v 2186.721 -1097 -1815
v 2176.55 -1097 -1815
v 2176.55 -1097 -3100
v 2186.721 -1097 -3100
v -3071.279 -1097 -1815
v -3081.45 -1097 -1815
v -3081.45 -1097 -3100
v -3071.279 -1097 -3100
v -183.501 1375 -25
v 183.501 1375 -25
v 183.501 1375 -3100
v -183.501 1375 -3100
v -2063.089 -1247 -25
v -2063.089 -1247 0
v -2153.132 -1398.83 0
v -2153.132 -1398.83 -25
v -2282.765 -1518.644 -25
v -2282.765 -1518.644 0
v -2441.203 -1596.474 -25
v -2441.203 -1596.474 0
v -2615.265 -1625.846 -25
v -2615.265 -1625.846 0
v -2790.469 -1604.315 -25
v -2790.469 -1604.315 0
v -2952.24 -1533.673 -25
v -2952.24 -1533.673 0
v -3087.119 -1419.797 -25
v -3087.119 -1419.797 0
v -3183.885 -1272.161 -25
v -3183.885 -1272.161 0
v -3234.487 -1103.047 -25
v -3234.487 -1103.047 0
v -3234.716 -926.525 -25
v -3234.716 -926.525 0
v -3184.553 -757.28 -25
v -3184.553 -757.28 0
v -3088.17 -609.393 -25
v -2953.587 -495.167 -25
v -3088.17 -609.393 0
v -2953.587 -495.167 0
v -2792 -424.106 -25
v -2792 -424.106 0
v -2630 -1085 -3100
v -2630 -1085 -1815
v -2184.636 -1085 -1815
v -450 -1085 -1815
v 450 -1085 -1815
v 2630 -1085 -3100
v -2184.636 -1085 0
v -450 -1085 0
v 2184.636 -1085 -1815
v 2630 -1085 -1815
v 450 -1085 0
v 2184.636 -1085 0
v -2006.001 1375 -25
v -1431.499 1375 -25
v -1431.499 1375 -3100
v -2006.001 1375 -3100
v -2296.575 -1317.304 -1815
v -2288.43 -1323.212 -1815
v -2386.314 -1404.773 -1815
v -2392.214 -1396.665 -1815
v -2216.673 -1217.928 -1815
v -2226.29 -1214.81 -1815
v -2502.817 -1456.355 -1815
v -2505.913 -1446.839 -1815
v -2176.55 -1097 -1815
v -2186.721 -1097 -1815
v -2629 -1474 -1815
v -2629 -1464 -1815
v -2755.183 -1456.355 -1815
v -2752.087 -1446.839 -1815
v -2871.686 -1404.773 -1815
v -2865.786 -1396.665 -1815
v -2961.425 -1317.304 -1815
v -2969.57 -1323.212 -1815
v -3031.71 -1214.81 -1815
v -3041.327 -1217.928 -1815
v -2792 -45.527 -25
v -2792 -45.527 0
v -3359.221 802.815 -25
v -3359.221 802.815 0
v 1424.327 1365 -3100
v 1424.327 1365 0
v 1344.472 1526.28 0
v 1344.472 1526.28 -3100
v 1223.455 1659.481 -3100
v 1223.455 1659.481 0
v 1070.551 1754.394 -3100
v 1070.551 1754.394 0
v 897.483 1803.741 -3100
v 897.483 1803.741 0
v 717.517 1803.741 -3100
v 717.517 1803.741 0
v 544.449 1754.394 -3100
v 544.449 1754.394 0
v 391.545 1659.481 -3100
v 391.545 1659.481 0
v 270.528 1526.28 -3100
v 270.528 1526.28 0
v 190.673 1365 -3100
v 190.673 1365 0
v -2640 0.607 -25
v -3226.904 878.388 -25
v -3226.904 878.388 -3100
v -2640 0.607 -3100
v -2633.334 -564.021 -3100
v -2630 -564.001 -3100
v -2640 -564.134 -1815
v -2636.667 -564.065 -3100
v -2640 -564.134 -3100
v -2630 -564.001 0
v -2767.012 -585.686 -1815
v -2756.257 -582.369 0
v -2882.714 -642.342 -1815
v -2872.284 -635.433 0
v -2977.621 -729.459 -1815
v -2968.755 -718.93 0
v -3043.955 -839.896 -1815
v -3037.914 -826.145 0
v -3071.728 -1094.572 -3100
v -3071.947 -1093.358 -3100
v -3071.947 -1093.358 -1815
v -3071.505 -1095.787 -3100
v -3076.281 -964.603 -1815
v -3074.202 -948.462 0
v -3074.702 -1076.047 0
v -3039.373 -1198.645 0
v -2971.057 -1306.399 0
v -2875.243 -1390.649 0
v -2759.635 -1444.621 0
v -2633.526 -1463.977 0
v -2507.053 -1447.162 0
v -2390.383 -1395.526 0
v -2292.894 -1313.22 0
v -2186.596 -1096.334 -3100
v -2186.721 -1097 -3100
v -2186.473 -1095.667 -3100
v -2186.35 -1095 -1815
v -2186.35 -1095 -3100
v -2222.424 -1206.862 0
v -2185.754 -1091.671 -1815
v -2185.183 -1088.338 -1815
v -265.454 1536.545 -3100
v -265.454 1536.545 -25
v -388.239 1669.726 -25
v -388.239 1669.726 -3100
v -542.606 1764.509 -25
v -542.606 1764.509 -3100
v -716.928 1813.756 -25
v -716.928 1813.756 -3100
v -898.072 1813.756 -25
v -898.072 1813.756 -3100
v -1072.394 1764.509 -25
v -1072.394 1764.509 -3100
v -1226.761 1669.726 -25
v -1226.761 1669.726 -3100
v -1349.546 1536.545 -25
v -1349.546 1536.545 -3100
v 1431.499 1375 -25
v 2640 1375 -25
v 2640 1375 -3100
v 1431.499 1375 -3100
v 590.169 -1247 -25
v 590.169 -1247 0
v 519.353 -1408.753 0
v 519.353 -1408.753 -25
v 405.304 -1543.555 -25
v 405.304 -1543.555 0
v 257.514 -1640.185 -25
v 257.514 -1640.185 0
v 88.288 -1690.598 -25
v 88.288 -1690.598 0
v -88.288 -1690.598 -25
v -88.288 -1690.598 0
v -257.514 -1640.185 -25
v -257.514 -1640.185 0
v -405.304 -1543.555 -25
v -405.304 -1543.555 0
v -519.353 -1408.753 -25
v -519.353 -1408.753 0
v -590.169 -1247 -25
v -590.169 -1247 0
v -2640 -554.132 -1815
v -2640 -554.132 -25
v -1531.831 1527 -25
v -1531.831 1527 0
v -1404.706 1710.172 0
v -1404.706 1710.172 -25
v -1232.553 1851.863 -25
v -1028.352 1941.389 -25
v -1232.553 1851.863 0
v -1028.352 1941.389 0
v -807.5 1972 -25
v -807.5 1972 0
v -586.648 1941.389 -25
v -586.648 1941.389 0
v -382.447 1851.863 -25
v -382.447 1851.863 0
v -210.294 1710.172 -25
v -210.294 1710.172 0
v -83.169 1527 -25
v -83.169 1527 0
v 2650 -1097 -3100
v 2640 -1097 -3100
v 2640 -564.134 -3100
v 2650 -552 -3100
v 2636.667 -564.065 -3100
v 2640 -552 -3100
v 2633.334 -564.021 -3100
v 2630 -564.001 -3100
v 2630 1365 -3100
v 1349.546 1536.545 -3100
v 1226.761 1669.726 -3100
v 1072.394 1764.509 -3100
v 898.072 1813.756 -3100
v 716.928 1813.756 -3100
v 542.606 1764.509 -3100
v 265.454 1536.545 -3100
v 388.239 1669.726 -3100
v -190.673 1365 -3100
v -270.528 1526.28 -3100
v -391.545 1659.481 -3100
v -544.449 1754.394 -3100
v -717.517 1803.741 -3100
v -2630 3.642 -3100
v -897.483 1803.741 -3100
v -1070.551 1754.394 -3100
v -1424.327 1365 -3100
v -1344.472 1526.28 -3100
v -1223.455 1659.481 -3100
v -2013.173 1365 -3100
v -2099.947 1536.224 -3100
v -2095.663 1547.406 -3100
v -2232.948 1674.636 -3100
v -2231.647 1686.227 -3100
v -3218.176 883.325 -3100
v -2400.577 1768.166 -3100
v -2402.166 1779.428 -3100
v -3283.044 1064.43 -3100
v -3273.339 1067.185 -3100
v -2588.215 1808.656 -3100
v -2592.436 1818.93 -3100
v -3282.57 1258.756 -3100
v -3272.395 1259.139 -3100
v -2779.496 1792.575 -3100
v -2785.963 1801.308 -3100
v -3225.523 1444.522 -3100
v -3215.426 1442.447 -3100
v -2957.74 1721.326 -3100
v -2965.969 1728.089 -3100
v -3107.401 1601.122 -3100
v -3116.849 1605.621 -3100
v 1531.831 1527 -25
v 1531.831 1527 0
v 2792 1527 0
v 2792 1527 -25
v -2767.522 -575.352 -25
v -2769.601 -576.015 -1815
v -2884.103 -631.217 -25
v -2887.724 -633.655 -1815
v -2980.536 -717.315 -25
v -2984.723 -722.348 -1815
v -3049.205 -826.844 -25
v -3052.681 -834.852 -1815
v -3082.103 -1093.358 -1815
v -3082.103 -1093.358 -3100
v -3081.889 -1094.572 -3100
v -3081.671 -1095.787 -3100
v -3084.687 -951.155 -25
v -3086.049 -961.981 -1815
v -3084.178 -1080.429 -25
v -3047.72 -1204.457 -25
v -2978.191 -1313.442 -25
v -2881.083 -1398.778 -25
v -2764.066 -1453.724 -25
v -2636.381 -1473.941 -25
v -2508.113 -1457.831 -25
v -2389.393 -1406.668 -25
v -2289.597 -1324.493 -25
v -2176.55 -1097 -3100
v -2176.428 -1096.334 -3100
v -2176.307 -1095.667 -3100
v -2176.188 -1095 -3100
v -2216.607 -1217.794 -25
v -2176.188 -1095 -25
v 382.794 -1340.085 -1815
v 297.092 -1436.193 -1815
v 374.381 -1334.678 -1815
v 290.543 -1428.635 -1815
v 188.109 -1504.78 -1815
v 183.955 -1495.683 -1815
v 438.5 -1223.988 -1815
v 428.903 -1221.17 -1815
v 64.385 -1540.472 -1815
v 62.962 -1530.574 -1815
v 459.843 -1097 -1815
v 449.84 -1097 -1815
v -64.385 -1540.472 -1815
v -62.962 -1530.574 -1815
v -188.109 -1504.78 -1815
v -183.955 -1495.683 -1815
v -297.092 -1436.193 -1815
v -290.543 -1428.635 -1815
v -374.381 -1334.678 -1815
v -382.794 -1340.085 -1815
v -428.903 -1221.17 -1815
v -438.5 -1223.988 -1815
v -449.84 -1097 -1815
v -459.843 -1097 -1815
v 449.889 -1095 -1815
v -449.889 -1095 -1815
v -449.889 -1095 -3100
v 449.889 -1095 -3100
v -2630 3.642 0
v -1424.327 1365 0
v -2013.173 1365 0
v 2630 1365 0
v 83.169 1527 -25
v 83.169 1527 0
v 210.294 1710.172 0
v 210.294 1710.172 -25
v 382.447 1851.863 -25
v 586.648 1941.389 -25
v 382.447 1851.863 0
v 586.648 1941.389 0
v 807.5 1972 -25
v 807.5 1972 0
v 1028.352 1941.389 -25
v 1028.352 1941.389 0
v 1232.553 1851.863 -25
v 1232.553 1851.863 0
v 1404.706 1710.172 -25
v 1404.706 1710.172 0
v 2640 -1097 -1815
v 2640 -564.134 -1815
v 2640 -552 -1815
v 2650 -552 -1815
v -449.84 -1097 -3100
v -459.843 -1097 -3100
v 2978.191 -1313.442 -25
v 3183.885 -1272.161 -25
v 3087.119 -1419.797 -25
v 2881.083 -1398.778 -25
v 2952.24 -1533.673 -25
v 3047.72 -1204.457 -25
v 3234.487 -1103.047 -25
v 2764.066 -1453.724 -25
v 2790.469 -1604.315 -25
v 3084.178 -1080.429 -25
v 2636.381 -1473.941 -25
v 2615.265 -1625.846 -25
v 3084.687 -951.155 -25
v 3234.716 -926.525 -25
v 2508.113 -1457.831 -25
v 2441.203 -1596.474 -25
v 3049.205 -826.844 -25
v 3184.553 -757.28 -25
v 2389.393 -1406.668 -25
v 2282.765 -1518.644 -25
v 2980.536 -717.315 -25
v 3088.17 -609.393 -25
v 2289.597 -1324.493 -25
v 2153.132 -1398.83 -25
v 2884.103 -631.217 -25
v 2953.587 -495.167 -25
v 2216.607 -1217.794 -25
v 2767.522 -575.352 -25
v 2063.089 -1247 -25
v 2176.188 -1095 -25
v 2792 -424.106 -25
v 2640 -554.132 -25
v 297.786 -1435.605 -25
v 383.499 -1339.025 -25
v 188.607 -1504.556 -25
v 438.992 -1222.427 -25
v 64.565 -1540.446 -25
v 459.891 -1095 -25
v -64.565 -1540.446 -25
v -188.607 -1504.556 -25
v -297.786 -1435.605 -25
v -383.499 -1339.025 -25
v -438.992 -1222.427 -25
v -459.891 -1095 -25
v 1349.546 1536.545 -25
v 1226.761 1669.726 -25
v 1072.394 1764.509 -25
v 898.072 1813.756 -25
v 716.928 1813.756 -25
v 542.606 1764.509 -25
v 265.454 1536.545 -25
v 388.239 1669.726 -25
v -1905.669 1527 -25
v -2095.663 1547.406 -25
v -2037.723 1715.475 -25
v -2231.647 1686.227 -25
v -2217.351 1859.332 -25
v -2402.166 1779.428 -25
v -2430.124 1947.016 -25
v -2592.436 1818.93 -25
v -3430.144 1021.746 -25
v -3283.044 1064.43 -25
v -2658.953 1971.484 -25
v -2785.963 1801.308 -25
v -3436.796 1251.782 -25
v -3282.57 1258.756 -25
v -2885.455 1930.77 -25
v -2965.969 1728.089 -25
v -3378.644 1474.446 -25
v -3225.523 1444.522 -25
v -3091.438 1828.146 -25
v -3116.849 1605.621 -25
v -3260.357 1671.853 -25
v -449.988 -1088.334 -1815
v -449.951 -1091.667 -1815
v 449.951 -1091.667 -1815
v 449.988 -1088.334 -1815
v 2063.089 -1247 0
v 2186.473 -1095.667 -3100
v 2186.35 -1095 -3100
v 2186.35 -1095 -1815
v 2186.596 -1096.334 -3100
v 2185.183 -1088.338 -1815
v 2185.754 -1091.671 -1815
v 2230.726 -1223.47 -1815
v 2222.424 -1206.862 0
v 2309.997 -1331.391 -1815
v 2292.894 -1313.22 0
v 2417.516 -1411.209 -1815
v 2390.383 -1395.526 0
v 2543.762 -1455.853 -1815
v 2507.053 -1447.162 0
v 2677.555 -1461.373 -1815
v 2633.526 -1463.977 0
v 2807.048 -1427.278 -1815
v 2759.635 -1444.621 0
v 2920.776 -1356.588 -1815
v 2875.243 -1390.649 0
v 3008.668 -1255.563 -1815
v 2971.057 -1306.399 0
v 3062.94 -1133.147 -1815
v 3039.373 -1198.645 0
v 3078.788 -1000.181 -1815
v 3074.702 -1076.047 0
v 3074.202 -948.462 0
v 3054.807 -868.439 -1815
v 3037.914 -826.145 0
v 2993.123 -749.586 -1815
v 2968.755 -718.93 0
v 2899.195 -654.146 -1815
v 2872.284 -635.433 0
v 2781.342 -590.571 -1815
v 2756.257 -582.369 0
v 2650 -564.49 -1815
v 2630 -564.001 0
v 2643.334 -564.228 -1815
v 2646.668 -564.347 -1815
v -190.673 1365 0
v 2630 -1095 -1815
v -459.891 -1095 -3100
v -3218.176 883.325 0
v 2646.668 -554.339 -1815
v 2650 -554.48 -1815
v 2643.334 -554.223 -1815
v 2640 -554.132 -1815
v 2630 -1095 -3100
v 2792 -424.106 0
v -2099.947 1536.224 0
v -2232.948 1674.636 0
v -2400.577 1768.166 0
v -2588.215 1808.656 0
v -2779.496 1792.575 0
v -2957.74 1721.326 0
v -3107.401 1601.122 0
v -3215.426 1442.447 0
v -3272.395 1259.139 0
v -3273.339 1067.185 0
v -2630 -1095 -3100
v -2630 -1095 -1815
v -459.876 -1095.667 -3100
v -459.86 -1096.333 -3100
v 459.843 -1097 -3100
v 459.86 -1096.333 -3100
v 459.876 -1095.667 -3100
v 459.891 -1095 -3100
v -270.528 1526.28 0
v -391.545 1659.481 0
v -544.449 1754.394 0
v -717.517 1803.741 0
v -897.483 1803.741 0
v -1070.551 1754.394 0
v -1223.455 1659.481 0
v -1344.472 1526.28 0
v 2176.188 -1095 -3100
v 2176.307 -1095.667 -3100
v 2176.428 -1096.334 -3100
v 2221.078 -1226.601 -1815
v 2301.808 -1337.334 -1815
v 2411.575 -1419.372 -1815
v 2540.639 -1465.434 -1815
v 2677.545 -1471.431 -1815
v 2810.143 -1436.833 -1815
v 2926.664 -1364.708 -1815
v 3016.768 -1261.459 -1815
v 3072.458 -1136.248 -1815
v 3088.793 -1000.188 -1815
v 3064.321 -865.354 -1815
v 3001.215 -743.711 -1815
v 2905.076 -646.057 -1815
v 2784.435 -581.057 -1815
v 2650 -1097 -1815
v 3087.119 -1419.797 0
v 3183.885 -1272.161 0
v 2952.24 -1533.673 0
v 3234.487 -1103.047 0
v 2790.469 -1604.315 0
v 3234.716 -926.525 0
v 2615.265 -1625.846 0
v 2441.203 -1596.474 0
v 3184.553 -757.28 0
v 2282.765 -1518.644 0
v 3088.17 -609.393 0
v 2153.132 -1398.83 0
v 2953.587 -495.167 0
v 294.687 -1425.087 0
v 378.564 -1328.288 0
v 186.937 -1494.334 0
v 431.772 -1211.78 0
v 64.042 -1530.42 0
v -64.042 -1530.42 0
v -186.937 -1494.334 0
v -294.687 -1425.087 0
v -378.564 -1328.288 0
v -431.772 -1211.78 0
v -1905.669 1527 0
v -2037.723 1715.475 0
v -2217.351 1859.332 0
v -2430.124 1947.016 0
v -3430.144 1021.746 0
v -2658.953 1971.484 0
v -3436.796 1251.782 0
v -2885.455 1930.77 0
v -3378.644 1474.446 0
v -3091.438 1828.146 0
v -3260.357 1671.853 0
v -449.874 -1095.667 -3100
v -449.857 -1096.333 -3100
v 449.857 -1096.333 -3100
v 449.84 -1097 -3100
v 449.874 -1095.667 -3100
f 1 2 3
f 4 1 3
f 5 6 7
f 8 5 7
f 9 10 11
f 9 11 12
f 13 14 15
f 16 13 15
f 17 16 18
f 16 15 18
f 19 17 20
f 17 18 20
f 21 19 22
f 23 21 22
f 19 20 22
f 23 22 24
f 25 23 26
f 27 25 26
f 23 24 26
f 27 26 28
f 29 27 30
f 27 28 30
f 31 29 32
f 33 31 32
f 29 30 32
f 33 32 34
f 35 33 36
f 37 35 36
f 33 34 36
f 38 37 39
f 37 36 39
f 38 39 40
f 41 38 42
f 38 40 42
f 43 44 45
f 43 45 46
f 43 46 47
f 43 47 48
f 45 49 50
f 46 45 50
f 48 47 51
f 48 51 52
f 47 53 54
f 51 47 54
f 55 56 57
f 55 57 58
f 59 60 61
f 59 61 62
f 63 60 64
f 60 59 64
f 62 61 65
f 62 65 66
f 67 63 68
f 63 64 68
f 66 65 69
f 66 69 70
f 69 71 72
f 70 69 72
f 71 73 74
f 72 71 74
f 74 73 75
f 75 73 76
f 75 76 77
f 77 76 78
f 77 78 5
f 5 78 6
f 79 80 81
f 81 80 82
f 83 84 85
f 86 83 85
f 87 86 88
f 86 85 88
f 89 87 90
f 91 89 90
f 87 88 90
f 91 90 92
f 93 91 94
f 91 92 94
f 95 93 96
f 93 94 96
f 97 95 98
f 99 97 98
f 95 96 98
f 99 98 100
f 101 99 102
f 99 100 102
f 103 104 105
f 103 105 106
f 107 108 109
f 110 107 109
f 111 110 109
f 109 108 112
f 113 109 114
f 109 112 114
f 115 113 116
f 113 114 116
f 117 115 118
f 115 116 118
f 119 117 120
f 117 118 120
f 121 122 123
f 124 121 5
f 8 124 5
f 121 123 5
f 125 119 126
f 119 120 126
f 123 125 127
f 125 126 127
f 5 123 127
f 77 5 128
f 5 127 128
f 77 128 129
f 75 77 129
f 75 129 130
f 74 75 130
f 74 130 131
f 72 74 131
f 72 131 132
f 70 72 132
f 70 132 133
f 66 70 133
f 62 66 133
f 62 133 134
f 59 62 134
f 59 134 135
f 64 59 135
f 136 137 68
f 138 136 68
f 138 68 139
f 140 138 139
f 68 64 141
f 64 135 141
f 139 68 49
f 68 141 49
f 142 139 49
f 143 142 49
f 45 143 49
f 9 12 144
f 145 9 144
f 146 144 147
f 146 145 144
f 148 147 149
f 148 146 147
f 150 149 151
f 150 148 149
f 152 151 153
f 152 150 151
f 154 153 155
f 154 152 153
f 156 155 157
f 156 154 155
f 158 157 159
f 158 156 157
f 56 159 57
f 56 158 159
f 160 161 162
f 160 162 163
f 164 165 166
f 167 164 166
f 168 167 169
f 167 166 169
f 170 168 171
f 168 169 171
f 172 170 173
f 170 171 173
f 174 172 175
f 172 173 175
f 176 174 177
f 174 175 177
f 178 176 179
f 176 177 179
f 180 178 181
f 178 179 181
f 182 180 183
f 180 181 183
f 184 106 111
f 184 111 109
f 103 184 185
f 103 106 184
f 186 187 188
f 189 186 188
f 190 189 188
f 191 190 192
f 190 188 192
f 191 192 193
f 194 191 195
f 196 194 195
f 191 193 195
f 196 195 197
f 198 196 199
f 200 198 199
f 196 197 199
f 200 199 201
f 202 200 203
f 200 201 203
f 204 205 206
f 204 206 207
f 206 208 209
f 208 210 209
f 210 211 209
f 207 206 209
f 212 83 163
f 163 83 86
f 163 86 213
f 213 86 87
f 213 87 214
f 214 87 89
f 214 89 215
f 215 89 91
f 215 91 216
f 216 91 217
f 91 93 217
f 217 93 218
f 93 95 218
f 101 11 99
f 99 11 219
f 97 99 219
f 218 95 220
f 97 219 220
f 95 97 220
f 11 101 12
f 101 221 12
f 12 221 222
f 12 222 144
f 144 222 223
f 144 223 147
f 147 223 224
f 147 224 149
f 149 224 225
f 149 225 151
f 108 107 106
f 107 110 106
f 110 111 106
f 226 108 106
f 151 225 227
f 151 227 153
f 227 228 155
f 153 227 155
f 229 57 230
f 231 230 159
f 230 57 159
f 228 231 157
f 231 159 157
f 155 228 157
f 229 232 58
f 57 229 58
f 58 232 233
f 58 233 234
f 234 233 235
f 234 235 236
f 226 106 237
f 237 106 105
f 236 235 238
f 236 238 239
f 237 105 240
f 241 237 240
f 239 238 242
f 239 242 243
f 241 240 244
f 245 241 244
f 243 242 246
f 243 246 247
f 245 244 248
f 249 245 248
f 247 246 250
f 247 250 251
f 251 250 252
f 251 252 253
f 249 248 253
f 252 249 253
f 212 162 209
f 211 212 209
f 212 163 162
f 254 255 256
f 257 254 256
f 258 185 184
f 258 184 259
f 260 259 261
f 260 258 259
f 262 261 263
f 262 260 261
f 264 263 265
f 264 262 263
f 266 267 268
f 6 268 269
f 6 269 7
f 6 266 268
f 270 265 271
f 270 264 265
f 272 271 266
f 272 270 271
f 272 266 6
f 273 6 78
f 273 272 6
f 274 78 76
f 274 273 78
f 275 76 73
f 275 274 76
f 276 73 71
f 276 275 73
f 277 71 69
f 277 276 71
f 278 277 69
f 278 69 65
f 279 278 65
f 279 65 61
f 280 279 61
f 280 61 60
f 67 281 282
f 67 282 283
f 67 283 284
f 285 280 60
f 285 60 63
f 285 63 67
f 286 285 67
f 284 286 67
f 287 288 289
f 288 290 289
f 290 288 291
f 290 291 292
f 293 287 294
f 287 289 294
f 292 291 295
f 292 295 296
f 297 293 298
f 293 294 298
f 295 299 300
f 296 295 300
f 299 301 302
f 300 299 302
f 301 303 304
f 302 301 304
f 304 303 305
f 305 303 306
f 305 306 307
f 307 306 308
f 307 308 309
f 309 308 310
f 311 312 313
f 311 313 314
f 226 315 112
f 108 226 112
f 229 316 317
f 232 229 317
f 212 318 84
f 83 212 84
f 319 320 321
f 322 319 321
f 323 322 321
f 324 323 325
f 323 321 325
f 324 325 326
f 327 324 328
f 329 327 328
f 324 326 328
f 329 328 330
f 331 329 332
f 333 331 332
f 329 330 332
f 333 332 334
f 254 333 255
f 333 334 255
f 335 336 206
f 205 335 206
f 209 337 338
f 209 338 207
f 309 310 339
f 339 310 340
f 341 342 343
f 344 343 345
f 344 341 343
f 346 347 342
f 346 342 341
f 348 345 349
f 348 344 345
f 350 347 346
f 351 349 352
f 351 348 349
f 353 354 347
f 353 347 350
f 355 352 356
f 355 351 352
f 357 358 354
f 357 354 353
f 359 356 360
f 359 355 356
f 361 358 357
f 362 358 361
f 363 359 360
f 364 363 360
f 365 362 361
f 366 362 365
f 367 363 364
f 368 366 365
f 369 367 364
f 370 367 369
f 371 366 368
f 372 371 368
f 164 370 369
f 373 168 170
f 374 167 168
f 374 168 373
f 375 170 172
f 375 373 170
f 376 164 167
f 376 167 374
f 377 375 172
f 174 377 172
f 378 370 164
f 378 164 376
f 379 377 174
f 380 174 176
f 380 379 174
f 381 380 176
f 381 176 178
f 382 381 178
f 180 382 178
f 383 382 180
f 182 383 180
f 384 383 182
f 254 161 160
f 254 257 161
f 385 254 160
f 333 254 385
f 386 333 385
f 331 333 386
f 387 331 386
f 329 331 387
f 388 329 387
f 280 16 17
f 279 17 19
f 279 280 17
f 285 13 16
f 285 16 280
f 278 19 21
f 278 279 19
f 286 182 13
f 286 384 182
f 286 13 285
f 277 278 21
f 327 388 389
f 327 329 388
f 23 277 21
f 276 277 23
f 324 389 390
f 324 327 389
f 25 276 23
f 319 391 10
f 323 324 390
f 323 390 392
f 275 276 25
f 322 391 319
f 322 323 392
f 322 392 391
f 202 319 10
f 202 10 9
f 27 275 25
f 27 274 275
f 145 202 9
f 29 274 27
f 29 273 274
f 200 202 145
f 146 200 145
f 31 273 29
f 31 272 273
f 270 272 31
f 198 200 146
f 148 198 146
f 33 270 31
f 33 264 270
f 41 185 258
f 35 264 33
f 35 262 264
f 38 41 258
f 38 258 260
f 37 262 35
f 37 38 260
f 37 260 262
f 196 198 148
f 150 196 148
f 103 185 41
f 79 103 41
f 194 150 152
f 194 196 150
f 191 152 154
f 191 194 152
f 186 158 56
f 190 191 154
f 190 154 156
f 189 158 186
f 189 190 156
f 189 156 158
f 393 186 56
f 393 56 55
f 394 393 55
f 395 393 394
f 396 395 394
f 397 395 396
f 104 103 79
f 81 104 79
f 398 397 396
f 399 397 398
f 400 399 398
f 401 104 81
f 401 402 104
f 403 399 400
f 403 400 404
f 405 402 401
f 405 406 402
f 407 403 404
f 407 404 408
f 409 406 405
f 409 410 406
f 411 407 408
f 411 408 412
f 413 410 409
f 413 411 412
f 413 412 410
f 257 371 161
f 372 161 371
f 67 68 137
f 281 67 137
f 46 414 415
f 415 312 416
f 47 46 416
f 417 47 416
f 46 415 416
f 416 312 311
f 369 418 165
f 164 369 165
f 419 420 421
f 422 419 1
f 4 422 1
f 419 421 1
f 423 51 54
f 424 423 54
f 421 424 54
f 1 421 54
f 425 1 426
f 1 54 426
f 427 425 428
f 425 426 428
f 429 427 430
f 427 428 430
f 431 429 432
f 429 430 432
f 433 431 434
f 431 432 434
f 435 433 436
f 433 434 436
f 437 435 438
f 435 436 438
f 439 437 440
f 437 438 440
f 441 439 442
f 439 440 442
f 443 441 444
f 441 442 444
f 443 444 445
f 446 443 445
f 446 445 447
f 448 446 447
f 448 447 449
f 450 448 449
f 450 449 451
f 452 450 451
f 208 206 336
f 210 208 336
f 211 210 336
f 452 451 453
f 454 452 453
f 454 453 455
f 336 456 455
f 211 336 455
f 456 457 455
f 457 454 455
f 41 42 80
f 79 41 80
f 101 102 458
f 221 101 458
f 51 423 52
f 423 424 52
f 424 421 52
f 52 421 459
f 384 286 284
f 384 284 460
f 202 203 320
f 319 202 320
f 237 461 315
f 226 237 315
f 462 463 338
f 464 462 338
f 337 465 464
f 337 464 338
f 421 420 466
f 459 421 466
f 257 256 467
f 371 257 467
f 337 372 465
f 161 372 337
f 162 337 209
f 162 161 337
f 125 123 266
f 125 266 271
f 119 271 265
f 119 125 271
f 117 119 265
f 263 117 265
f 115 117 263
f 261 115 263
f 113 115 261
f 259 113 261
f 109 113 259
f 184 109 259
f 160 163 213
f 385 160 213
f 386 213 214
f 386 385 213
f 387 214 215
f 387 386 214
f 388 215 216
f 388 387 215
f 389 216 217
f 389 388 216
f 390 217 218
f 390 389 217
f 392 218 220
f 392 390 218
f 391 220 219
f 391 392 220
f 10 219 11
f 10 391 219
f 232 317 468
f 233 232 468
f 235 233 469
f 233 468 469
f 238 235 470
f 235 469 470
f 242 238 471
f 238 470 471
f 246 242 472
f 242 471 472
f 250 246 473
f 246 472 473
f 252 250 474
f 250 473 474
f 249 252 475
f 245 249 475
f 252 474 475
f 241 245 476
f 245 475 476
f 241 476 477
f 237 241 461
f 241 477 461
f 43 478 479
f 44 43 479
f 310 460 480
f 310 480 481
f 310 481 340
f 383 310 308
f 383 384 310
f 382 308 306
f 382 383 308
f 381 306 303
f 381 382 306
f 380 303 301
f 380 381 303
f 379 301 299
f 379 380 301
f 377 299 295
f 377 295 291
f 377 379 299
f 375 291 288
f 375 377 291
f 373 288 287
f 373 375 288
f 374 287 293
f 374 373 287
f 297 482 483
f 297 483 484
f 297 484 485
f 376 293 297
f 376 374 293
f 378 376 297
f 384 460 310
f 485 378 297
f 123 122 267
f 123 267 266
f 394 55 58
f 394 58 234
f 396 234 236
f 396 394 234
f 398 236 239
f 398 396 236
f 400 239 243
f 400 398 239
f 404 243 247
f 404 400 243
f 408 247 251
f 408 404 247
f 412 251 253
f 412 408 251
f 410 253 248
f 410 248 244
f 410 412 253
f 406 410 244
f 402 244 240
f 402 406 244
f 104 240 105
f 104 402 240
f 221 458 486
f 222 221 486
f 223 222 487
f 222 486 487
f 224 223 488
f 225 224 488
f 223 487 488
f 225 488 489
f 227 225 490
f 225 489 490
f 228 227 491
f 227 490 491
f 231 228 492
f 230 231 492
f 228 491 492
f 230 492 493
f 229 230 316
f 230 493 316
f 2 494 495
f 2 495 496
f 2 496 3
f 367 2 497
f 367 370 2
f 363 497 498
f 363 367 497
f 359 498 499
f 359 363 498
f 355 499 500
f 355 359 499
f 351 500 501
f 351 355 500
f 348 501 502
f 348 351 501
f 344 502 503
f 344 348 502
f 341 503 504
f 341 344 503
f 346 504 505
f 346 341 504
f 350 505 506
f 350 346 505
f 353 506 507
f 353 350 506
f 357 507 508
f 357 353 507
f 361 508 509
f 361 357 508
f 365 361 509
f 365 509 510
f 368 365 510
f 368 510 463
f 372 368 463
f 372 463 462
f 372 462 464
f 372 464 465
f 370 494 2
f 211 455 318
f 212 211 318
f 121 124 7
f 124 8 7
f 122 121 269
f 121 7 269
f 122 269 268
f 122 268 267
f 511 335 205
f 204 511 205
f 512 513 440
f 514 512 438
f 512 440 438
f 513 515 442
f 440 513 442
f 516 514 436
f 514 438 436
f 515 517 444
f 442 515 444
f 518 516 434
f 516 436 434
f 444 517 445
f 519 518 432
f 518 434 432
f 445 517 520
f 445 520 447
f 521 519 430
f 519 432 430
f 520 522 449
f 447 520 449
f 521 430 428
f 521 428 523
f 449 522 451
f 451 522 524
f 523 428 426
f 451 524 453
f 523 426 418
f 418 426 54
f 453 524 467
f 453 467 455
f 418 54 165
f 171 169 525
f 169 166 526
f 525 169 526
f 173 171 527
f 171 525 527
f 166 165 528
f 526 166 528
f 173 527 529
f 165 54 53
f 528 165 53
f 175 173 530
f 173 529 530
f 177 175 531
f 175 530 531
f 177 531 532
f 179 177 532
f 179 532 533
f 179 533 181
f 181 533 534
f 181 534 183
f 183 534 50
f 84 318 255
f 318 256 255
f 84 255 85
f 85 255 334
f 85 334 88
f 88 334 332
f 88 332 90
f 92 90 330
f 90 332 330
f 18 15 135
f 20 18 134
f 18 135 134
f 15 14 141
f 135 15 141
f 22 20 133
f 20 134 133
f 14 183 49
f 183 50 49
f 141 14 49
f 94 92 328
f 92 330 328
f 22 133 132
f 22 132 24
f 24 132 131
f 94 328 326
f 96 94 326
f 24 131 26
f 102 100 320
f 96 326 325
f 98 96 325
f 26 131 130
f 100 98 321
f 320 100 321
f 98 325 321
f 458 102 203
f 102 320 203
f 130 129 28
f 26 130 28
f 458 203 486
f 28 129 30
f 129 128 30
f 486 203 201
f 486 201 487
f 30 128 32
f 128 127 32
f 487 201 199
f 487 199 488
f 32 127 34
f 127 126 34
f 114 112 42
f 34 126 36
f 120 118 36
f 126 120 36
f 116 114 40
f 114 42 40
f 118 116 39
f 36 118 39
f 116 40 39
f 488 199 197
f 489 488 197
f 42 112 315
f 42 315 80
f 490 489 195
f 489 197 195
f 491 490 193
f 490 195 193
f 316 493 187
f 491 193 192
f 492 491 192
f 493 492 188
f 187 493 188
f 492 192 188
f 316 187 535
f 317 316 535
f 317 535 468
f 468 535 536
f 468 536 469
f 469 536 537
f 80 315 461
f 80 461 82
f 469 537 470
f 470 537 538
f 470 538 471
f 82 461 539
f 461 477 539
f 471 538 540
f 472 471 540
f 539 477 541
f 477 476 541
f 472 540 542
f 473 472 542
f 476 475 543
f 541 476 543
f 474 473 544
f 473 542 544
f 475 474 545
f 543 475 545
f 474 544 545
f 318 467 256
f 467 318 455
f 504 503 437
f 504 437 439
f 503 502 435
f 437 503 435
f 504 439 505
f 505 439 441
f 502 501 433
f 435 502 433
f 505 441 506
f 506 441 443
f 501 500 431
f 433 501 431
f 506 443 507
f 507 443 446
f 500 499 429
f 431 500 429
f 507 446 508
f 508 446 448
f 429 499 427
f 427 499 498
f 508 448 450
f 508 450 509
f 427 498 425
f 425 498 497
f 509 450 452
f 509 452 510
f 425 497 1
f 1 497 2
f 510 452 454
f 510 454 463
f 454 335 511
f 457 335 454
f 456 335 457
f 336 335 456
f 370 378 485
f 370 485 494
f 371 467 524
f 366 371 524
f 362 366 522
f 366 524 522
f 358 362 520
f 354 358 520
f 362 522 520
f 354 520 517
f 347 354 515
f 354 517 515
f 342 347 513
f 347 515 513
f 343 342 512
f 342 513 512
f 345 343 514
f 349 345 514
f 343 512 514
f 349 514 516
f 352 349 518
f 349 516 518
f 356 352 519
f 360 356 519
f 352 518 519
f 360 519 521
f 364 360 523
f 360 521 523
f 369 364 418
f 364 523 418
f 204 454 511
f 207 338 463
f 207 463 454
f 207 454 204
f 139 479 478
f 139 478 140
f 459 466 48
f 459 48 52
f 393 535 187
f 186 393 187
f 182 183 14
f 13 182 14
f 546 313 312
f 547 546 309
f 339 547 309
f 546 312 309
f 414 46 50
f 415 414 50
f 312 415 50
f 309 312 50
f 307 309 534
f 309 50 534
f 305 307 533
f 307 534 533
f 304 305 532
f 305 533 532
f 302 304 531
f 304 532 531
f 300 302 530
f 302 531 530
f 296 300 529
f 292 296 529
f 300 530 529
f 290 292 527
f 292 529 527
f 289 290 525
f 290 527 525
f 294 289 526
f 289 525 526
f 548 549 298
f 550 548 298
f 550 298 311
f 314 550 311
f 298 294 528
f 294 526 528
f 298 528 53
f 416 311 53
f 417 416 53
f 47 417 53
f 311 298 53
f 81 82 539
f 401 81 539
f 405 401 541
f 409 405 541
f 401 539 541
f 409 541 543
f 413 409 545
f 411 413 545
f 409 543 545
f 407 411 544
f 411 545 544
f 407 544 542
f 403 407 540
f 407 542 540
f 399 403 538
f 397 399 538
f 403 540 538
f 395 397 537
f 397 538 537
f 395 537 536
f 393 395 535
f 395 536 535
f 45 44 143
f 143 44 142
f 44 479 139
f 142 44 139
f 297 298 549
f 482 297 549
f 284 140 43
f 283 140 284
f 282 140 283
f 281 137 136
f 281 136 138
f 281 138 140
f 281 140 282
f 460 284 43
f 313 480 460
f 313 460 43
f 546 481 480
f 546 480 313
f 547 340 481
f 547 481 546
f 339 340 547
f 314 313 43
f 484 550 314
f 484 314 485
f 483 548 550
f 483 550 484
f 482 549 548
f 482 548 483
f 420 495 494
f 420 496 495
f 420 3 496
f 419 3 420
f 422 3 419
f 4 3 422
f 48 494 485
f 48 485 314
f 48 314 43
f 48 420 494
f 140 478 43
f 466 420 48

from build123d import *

# Parameters (mm, degrees)
EXTRUDE_THIN2_DEPTH     = 3100
BOSS_EXTRUDE2_DEPTH     = 25
CUT_EXTRUDE1_DEPTH      = 7106.596948885
CUT_EXTRUDE1_DEPTH_BACK = 7106.596948885
SKETCH7_W               = 1405.301830193
SKETCH7_H               = 450
SKETCH8_W               = 5260
SKETCH8_H               = 1285
BOSS_EXTRUDE3_DEPTH     = 10
CUT_EXTRUDE2_OUTLINE_W  = 1285
CUT_EXTRUDE2_OUTLINE_H  = 545
CUT_EXTRUDE2_DEPTH      = 449
SKETCH10_W              = 1285
SKETCH10_H              = 545
BOSS_EXTRUDE4_DEPTH     = 10
CUT_EXTRUDE3_OUTLINE_W  = 1285
CUT_EXTRUDE3_OUTLINE_H  = 541.35782885
CUT_EXTRUDE3_DEPTH      = 449


# Read off the part's stored shape, not the designer's step: Cut-Extrude2, Cut-Extrude3
with BuildPart() as part:
    # body → Extrude-Thin2 (new body)
    with BuildSketch(Plane.XY):
        with BuildLine():
            Line((-3226.904268523, 878.38804319), (-2640, 0.607028525))
            Line((-2640, 0.607028525), (-2640, -554.131540547))
            ThreePointArc((-2640, -554.131540547), (-2978.190785718, -1313.44247389), (-2176.187676846, -1095))
            Line((-2176.187676846, -1095), (-459.891291503, -1095))
            ThreePointArc((-459.891291503, -1095), (0, -1545), (459.891291503, -1095))
            Line((459.891291503, -1095), (2176.187676846, -1095))
            ThreePointArc((2176.187676846, -1095), (2978.190785718, -1313.44247389), (2640, -554.131540547))
            Line((2640, -554.131540547), (2640, 1375))
            Line((2640, 1375), (1431.499198717, 1375))
            ThreePointArc((1431.499198717, 1375), (807.5, 1820), (183.500801283, 1375))
            Line((183.500801283, 1375), (-183.500801283, 1375))
            ThreePointArc((-183.500801283, 1375), (-807.5, 1820), (-1431.499198717, 1375))
            Line((-1431.499198717, 1375), (-2006.000801283, 1375))
            ThreePointArc((-2006.000801283, 1375), (-2878.675275655, 1771.359638247), (-3226.904268523, 878.38804319))
        make_face()
        with BuildLine():
            Line((-3218.17614189, 883.325414771), (-2630, 3.64217115))
            Line((-2630, 3.64217115), (-2630, -564.001111112))
            ThreePointArc((-2630, -564.001111112), (-2971.056689396, -1306.399078725), (-2184.636410132, -1085))
            Line((-2184.636410132, -1085), (-450, -1085))
            ThreePointArc((-450, -1085), (0, -1535), (450, -1085))
            Line((450, -1085), (2184.636410132, -1085))
            ThreePointArc((2184.636410132, -1085), (2971.056689396, -1306.399078725), (2630, -564.001111112))
            Line((2630, -564.001111112), (2630, 1365))
            Line((2630, 1365), (1424.326555849, 1365))
            ThreePointArc((1424.326555849, 1365), (807.5, 1810), (190.673444151, 1365))
            Line((190.673444151, 1365), (-190.673444151, 1365))
            ThreePointArc((-190.673444151, 1365), (-807.5, 1810), (-1424.326555849, 1365))
            Line((-1424.326555849, 1365), (-2013.173444151, 1365))
            ThreePointArc((-2013.173444151, 1365), (-2871.262954199, 1763.566224147), (-3218.17614189, 883.325414771))
        make_face(mode=Mode.SUBTRACT)
    extrude(amount=-EXTRUDE_THIN2_DEPTH)

    # curb → Boss-Extrude2 (add)
    with BuildSketch(Plane.XY):
        with BuildLine():
            Line((-83.169274433, 1527), (83.169274433, 1527))
            ThreePointArc((83.169274433, 1527), (807.5, 1972), (1531.830725567, 1527))
            Line((1531.830725567, 1527), (2792, 1527))
            Line((2792, 1527), (2792, -424.105941715))
            ThreePointArc((2792, -424.105941715), (3087.118903787, -1419.796833395), (2063.089229648, -1247))
            Line((2063.089229648, -1247), (590.169467187, -1247))
            ThreePointArc((590.169467187, -1247), (0, -1697), (-590.169467187, -1247))
            Line((-590.169467187, -1247), (-2063.089229648, -1247))
            ThreePointArc((-2063.089229648, -1247), (-3087.118903787, -1419.796833395), (-2792, -424.105941715))
            Line((-2792, -424.105941715), (-2792, -45.527139379))
            Line((-2792, -45.527139379), (-3359.22062819, 802.81478835))
            ThreePointArc((-3359.22062819, 802.81478835), (-2992.100860231, 1886.792244744), (-1905.669274433, 1527))
            Line((-1905.669274433, 1527), (-1531.830725567, 1527))
            ThreePointArc((-1531.830725567, 1527), (-807.5, 1972), (-83.169274433, 1527))
        make_face()
        with BuildLine():
            ThreePointArc((-2006.000801283, 1375), (-2878.675275655, 1771.359638247), (-3226.904268523, 878.38804319))
            Line((-3226.904268523, 878.38804319), (-2640, 0.607028525))
            Line((-2640, 0.607028525), (-2640, -554.131540547))
            ThreePointArc((-2640, -554.131540547), (-2978.190785718, -1313.44247389), (-2176.187676846, -1095))
            Line((-2176.187676846, -1095), (-459.891291503, -1095))
            ThreePointArc((-459.891291503, -1095), (0, -1545), (459.891291503, -1095))
            Line((459.891291503, -1095), (2176.187676846, -1095))
            ThreePointArc((2176.187676846, -1095), (2978.190785718, -1313.44247389), (2640, -554.131540547))
            Line((2640, -554.131540547), (2640, 1375))
            Line((2640, 1375), (1431.499198717, 1375))
            ThreePointArc((1431.499198717, 1375), (807.5, 1820), (183.500801283, 1375))
            Line((183.500801283, 1375), (-183.500801283, 1375))
            ThreePointArc((-183.500801283, 1375), (-807.5, 1820), (-1431.499198717, 1375))
            Line((-1431.499198717, 1375), (-2006.000801283, 1375))
        make_face(mode=Mode.SUBTRACT)
    extrude(amount=-BOSS_EXTRUDE2_DEPTH)

    # Sketch7 → Cut-Extrude1 (cut, two sides: drawn at the far end of the back side and taken through both)
    with BuildSketch(Plane(origin=(2640, 0, 0), x_dir=(0, 0, -1), z_dir=(1, 0, 0)).offset(-CUT_EXTRUDE1_DEPTH_BACK)):
        with Locations((2517.650915097, -1322)):
            Rectangle(SKETCH7_W, SKETCH7_H)
    extrude(amount=CUT_EXTRUDE1_DEPTH + CUT_EXTRUDE1_DEPTH_BACK, mode=Mode.SUBTRACT)

    # Sketch8 → Boss-Extrude3 (add)
    with BuildSketch(Plane.XZ.offset(1095)):
        with Locations((0, -2457.5)):
            Rectangle(SKETCH8_W, SKETCH8_H)
    extrude(amount=-BOSS_EXTRUDE3_DEPTH)

    # Cut-Extrude2 outline → Cut-Extrude2 (cut)
    with BuildSketch(Plane(origin=(2640, 0, 0), x_dir=(0, 0, -1), z_dir=(1, 0, 0))):
        with Locations((2457.5, -824.5)):
            Rectangle(CUT_EXTRUDE2_OUTLINE_W, CUT_EXTRUDE2_OUTLINE_H)
    extrude(amount=CUT_EXTRUDE2_DEPTH, mode=Mode.SUBTRACT)

    # Sketch10 → Boss-Extrude4 (add)
    with BuildSketch(Plane(origin=(2640, 0, 0), x_dir=(0, 0, -1), z_dir=(1, 0, 0))):
        with Locations((2457.5, -824.5)):
            Rectangle(SKETCH10_W, SKETCH10_H)
    extrude(amount=BOSS_EXTRUDE4_DEPTH)

    # Cut-Extrude3 outline → Cut-Extrude3 (cut)
    with BuildSketch(Plane.ZY.offset(2640)):
        with Locations((-2457.5, -822.678914425)):
            Rectangle(CUT_EXTRUDE3_OUTLINE_W, CUT_EXTRUDE3_OUTLINE_H)
    extrude(amount=CUT_EXTRUDE3_DEPTH, mode=Mode.SUBTRACT)


solid = part.part
